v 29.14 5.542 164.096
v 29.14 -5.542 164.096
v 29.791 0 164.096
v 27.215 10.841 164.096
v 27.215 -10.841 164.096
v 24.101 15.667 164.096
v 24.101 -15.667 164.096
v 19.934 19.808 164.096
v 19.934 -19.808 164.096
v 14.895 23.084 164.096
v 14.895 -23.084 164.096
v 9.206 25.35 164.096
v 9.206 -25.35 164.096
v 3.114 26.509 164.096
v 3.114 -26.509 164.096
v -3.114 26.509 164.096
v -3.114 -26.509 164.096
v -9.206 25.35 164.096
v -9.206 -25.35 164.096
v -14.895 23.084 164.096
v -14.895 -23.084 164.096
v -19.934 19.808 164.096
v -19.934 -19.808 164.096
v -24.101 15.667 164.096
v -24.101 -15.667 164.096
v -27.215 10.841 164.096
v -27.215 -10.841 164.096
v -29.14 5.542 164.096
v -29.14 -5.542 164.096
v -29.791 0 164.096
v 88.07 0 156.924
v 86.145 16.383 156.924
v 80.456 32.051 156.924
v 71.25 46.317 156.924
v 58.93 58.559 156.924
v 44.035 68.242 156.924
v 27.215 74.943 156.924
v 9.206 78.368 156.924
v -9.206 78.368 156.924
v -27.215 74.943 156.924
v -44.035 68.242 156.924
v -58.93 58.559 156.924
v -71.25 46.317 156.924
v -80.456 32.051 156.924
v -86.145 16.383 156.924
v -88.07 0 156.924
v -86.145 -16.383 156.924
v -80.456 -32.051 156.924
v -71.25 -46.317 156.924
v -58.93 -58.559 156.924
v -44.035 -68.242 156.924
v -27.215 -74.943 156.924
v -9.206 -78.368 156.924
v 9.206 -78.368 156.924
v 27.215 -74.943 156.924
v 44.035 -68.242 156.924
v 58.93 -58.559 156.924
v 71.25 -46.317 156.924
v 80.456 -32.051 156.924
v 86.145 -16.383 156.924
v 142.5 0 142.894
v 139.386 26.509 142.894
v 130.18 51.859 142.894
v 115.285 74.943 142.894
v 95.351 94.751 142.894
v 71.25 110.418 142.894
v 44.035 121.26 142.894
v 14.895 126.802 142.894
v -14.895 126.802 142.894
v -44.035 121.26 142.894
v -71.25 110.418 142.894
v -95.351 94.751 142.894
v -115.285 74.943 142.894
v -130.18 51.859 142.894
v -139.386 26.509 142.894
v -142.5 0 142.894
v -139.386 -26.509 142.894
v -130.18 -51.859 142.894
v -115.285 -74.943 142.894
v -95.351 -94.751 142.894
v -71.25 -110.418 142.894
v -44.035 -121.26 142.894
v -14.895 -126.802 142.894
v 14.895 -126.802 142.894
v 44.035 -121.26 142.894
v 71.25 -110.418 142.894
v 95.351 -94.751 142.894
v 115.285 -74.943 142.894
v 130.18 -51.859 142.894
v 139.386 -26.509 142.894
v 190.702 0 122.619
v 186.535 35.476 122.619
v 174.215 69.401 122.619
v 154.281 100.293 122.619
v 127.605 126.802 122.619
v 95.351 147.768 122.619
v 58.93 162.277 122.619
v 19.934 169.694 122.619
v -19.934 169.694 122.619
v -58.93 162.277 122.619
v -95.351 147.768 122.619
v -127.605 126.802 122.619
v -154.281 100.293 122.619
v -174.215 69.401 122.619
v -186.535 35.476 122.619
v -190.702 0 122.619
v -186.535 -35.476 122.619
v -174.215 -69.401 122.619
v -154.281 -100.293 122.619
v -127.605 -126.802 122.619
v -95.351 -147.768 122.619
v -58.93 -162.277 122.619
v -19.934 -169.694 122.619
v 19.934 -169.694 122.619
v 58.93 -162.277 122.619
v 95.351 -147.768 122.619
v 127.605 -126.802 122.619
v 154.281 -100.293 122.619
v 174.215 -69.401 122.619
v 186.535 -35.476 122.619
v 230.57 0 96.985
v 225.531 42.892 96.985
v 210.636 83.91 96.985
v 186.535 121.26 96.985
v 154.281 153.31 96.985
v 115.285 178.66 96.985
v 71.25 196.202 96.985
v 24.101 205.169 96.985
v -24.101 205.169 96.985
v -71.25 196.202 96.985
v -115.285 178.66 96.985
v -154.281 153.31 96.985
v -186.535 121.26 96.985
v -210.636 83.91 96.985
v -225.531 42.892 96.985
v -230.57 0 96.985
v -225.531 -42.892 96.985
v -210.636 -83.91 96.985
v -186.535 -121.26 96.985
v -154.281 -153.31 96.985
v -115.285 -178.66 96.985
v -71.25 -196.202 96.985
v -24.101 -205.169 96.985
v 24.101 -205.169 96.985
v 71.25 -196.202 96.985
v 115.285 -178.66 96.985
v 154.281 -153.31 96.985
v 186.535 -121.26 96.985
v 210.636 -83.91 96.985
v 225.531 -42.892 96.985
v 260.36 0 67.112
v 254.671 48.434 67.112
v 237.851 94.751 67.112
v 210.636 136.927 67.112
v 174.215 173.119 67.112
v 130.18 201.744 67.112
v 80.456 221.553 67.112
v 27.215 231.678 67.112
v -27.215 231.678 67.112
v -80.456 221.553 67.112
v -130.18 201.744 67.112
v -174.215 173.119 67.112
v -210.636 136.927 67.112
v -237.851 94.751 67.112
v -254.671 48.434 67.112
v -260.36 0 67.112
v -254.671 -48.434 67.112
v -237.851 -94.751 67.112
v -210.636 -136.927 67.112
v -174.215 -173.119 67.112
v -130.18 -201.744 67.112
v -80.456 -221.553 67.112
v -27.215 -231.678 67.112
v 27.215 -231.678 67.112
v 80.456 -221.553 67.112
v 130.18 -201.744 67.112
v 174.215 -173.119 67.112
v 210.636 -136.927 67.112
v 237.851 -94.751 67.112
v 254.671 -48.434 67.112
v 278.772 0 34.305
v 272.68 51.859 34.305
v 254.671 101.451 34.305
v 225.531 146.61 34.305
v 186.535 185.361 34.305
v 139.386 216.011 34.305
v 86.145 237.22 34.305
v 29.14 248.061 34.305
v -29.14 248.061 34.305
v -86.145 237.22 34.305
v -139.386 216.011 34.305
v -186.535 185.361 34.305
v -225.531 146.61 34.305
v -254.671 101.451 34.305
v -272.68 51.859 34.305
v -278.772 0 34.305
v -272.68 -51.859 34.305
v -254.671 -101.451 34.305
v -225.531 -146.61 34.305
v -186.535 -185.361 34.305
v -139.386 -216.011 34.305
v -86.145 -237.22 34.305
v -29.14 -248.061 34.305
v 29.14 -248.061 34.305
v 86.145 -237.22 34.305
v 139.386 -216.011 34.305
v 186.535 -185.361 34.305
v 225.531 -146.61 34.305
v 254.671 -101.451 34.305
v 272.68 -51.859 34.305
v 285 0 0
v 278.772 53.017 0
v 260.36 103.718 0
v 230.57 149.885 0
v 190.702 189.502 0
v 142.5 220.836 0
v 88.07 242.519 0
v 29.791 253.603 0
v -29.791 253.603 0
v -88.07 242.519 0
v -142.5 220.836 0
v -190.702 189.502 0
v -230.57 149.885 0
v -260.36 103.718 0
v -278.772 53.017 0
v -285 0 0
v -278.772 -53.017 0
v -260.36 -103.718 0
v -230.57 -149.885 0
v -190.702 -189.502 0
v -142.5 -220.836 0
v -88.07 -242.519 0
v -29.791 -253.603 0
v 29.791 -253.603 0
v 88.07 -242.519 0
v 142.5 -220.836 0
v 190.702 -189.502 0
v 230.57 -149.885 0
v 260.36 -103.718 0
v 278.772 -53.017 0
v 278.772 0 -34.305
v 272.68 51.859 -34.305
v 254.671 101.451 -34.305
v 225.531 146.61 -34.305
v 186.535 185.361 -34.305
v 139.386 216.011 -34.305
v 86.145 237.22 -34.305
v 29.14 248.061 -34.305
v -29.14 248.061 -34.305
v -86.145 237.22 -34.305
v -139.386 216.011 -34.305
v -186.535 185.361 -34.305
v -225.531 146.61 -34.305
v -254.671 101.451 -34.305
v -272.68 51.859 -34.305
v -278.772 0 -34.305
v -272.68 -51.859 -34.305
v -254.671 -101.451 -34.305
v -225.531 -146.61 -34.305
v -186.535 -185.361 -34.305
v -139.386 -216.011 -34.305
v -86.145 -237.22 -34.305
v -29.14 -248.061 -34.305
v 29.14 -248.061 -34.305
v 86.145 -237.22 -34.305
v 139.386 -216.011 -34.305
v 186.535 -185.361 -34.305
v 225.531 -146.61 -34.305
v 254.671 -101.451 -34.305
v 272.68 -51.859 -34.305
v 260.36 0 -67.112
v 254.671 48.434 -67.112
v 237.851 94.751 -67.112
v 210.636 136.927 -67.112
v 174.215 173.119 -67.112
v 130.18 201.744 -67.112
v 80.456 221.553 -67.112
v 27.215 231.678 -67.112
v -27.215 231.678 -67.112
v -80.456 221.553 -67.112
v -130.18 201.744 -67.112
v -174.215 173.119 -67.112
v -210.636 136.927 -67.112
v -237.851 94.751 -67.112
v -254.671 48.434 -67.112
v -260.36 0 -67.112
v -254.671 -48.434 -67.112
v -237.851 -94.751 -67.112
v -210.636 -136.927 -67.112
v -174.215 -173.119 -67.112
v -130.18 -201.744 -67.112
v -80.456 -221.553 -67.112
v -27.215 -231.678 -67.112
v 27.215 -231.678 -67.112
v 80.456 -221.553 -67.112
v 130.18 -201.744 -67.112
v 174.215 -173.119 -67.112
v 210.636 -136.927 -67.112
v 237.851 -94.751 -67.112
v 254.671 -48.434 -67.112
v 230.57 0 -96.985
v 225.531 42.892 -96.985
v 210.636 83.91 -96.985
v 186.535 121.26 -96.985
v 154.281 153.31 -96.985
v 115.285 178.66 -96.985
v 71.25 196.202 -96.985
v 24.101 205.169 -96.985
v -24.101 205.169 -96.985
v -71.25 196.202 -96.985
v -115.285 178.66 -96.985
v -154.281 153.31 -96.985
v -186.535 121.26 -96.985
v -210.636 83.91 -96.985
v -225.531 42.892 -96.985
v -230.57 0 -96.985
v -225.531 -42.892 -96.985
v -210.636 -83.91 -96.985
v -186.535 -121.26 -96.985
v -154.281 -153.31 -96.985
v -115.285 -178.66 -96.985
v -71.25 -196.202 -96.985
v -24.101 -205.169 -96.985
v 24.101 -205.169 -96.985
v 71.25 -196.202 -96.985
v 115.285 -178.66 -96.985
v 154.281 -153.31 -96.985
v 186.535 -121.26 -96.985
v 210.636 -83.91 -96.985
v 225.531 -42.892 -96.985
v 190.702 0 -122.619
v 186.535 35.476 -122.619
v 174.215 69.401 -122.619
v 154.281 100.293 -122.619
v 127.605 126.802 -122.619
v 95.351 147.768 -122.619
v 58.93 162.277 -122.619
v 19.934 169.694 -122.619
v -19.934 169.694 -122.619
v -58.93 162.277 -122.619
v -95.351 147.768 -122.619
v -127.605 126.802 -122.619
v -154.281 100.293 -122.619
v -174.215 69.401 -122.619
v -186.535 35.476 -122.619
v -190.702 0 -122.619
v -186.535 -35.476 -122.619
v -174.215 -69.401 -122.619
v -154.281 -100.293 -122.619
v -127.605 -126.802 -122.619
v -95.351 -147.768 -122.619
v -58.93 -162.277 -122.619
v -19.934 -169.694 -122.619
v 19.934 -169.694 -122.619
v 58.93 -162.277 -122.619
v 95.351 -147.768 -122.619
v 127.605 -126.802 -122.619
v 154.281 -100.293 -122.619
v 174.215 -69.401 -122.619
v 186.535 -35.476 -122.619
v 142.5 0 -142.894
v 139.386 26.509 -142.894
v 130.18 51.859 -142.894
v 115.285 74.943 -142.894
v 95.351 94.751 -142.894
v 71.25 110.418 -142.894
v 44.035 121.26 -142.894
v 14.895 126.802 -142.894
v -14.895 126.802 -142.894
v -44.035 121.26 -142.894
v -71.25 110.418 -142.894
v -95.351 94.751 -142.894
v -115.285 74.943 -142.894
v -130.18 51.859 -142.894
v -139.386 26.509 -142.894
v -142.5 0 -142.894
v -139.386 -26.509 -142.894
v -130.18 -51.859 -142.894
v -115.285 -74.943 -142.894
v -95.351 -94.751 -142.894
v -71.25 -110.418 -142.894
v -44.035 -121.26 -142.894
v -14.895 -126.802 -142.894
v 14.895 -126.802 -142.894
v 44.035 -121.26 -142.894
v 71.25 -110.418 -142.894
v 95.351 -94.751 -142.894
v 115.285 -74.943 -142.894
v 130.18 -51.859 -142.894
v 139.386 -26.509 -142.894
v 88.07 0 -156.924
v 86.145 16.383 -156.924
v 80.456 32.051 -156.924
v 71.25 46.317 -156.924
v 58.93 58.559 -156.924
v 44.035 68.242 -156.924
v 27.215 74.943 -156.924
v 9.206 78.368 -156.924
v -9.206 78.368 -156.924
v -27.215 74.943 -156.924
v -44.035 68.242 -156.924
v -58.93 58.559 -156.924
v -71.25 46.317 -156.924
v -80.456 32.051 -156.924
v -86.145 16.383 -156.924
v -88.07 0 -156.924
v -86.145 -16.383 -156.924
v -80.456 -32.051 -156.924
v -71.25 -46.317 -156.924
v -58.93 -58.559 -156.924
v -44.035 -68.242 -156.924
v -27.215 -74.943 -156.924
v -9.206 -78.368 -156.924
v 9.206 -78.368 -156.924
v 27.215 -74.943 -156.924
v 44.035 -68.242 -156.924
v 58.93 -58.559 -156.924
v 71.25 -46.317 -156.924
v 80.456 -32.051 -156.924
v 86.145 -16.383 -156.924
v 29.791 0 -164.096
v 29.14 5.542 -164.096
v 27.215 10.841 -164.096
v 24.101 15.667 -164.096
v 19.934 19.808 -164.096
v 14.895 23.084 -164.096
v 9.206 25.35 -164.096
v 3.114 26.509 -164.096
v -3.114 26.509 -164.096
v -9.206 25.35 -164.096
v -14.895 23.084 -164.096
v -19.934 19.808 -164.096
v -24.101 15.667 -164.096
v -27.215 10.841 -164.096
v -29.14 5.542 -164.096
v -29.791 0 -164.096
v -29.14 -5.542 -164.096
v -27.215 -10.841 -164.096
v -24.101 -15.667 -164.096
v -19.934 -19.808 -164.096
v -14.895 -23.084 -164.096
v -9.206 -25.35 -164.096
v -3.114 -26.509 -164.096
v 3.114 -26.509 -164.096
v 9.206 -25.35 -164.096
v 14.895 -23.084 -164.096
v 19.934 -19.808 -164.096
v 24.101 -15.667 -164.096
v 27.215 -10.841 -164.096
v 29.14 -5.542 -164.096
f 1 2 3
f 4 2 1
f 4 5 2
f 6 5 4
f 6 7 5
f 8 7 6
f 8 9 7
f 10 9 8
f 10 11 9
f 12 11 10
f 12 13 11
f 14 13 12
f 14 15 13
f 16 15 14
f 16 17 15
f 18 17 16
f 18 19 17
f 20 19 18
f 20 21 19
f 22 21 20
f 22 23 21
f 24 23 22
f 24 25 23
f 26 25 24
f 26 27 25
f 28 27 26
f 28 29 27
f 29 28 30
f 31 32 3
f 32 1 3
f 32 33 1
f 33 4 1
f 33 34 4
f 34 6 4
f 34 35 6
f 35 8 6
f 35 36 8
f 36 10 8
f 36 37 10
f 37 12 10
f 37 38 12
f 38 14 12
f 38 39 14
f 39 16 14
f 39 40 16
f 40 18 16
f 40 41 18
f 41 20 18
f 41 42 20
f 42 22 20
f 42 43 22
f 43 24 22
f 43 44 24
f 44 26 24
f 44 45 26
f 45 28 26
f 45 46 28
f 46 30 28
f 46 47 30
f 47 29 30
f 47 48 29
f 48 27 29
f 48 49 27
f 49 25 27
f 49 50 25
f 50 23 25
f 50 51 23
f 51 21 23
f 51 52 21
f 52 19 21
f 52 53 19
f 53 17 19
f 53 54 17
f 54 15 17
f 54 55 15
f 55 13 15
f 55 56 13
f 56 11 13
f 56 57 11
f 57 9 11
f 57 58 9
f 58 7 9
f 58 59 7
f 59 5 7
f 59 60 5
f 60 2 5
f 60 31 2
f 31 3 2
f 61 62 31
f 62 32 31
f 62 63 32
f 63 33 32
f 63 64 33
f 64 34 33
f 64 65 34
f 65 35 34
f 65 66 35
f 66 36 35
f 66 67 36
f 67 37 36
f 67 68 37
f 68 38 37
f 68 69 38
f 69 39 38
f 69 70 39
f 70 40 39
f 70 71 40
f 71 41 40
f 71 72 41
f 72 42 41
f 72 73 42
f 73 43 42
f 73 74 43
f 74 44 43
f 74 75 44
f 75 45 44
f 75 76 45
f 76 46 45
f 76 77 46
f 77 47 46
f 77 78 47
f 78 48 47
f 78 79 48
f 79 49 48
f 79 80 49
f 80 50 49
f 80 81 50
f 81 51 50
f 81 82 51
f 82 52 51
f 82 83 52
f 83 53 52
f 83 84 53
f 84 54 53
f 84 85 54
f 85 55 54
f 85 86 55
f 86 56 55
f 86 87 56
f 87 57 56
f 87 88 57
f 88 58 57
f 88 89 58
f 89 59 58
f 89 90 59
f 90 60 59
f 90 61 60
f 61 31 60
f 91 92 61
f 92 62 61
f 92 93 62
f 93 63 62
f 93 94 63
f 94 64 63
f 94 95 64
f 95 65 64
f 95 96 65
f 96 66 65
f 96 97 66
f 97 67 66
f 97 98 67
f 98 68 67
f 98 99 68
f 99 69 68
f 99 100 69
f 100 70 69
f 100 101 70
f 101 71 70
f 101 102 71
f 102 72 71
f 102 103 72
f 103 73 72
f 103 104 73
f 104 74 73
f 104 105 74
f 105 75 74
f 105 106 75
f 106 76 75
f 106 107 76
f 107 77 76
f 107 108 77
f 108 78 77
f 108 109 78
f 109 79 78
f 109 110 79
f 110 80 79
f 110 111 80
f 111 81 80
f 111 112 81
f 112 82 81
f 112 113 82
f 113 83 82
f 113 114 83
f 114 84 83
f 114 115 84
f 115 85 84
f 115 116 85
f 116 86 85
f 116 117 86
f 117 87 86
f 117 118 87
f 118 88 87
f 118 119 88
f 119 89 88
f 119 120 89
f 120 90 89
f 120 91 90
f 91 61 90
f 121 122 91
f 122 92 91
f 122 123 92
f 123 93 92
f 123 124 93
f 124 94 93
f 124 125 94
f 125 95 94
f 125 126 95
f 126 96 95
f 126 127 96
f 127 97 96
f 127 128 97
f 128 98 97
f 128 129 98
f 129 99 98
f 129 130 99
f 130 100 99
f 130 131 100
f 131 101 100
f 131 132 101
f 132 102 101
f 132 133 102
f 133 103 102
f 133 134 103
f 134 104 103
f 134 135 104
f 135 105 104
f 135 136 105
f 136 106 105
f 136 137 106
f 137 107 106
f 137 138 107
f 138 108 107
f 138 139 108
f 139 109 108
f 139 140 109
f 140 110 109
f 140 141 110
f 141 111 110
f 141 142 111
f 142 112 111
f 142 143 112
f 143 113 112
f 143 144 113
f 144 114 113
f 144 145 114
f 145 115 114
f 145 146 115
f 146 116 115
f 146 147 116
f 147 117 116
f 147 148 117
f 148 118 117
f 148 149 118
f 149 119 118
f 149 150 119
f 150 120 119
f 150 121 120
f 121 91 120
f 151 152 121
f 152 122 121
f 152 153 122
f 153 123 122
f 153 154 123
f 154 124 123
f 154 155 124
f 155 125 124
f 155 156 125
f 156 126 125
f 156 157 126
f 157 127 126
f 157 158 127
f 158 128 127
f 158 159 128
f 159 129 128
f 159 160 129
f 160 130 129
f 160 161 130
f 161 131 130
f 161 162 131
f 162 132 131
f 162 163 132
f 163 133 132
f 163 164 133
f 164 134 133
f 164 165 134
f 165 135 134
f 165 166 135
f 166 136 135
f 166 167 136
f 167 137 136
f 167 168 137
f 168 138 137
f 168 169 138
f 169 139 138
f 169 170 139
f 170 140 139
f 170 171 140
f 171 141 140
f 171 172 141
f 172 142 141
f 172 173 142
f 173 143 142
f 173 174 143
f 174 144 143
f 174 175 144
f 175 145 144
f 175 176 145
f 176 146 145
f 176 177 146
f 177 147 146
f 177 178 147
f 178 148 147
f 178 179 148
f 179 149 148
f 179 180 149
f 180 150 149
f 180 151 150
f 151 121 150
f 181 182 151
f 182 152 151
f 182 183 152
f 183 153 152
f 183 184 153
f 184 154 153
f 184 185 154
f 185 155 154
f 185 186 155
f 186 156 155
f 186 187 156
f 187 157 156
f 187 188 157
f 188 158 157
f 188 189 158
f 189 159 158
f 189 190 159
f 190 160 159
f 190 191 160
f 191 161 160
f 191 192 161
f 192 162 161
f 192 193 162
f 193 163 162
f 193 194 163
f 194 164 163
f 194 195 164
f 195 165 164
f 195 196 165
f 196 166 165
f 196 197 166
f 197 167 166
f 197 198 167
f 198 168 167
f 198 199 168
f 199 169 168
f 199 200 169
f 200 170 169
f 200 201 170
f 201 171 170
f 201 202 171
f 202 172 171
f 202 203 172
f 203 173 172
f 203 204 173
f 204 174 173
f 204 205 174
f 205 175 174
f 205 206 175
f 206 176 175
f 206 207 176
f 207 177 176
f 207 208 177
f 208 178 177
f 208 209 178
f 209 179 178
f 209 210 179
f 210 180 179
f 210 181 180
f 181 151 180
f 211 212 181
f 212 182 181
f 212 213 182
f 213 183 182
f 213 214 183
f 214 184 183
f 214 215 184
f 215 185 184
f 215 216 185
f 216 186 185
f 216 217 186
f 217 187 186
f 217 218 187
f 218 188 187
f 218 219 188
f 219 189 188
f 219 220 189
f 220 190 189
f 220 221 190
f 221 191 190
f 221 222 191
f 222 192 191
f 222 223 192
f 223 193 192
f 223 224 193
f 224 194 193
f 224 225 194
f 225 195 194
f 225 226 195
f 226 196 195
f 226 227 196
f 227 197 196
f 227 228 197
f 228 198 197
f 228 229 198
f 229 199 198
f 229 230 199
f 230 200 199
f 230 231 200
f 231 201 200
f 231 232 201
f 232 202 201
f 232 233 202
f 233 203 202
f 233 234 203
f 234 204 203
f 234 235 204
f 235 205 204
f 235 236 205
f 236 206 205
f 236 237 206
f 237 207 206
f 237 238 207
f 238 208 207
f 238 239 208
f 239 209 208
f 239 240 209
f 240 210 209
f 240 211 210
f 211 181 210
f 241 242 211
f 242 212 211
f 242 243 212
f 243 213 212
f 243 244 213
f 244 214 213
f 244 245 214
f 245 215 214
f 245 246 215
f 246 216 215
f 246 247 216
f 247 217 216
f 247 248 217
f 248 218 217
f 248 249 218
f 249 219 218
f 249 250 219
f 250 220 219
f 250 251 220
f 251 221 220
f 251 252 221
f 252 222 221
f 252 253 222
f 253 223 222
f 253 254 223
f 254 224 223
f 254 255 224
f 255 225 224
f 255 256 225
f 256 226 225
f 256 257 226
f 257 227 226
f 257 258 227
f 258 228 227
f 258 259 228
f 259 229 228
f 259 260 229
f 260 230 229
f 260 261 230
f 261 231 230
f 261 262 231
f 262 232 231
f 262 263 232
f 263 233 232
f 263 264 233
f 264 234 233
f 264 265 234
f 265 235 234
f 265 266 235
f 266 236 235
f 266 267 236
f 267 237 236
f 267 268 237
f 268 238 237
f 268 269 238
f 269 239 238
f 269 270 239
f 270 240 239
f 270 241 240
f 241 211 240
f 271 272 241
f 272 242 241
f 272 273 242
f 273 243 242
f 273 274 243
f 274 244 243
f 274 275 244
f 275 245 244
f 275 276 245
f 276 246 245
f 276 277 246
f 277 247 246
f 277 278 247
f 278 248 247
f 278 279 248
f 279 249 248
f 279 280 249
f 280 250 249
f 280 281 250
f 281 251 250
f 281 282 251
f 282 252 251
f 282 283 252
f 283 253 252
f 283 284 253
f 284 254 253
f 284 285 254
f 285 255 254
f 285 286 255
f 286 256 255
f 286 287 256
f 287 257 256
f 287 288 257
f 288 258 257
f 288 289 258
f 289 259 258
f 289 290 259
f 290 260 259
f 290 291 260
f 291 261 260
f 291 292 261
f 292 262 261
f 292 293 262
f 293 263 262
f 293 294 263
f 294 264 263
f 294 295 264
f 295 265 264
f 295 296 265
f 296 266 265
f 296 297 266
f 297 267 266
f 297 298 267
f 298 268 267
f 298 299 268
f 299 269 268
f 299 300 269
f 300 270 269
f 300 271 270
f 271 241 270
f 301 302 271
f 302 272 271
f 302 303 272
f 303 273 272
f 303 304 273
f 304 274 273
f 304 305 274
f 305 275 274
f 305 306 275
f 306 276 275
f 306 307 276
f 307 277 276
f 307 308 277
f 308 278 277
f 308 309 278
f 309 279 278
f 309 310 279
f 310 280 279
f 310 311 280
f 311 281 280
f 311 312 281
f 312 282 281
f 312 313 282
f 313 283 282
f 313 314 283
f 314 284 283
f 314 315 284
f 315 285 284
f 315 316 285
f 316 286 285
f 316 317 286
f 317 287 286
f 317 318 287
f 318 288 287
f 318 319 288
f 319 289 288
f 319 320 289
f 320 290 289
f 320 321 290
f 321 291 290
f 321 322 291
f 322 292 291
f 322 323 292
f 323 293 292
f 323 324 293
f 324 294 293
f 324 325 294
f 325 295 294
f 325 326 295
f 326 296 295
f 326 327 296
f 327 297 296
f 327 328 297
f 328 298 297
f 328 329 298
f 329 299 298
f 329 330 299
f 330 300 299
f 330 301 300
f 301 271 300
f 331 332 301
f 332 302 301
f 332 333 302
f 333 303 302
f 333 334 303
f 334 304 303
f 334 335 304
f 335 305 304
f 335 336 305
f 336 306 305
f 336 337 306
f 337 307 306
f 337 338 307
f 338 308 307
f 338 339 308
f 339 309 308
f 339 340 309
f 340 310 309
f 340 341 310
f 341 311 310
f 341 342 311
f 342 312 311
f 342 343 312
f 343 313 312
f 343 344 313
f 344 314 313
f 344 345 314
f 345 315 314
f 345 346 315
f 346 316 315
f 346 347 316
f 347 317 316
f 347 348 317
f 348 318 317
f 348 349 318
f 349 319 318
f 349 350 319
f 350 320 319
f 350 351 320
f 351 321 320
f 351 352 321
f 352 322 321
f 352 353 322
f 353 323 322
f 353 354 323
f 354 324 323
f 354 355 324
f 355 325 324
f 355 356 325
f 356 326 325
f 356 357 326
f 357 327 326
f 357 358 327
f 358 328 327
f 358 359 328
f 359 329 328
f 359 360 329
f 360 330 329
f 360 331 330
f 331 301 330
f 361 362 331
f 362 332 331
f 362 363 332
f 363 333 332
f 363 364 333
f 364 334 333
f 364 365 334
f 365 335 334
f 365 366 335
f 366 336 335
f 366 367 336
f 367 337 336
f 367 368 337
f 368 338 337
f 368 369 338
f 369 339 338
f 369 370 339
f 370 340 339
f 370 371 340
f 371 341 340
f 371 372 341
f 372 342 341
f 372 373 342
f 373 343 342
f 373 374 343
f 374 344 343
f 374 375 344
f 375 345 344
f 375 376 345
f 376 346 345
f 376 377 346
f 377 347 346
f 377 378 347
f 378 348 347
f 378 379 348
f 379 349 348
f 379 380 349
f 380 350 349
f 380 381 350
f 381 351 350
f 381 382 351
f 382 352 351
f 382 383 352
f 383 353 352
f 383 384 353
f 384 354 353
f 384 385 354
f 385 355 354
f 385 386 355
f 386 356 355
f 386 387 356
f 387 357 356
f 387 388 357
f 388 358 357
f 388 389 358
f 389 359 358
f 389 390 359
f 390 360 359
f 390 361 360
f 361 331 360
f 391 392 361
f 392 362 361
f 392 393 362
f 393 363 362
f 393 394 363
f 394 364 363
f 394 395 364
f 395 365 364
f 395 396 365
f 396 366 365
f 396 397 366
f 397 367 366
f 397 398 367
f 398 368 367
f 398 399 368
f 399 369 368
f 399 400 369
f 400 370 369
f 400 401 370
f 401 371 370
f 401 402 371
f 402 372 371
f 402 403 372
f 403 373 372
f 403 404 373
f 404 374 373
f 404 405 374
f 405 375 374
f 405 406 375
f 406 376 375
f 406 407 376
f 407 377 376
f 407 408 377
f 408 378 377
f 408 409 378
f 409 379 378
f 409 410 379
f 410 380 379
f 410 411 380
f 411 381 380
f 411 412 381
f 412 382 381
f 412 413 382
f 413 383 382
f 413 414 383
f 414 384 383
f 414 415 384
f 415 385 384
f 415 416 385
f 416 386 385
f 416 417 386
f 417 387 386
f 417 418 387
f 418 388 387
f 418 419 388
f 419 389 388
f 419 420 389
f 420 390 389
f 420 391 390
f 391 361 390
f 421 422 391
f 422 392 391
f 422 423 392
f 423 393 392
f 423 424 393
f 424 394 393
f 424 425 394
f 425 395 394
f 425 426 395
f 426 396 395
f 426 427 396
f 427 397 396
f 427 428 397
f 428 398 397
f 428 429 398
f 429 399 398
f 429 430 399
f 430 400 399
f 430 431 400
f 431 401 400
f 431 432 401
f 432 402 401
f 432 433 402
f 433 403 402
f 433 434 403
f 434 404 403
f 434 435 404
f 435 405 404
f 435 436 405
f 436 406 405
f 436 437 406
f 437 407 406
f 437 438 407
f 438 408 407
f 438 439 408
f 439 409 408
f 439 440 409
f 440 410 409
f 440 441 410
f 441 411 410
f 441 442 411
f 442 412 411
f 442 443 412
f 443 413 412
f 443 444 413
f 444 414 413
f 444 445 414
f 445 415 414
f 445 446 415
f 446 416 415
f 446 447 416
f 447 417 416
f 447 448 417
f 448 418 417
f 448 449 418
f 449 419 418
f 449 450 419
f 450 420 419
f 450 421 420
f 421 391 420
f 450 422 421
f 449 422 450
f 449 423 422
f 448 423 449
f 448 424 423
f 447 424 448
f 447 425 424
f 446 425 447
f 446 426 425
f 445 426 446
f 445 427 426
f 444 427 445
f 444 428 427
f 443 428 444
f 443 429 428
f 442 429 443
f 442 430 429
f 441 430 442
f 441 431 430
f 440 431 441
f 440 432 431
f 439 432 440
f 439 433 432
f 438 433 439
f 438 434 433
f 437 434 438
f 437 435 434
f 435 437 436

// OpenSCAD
// Generated by SolidPython 1.0.1 on 2020-07-29 00:46:54


scale(v = [19, 17, 11]) {
	sphere(r = 15);
}
/***********************************************
*********      SolidPython code:      **********
************************************************
 
# import packages: SolidPython
from solid import *
from solid.utils import *
from itertools import chain, combinations, permutations


class Resize:

    def __init__(self, scad_file):
        self.scad_file = scad_file
        #self.scad_file = import_scad(scad_file)
        # cone/cylinder param:
        self.r1 = 0
        self.r2 = 0
        self.h = 0
        # rectangular prism param:
        self.w = 0
        self.l = 0
        # ellipse param:
        self.r = 0

    # import OpenScad code (file name corresponds to shape)


    # classify shape + parameters
    def assign(self, param1, param2, param3):
        if self.scad_file == 'cone.scad':
            self.r1 = param1
            self.r2 = param2
            self.h = param3
        elif self.scad_file == 'cylinder.scad':
            self.r1 = param1
            self.r2 = param2
            self.h = param3
        elif self.scad_file == 'rectangularPrism.scad':
            self.h = param1
            self.l = param2
            self.w = param3
        else:
            self.r = param1
            self.h = param2

    # resize parameters
    def iterate(self):
        x = range(3, 20, 2)
        i = 1
        if self.scad_file == 'cone.scad':
            tempList = list(permutations(x, 2))
            for temp in tempList:
                param1 = temp[0]
                param2 = temp[1]
                filepath = 'produced_scad_files/' + 'cone' + str(param1) + '_' + str(param2) + '_' + '.scad'
                scad_render_to_file(cylinder(h=param1, r1=param2, r2=0), filepath)

        elif self.scad_file == 'cylinder.scad':
            tempList = list(permutations(x, 3))
            for temp in tempList:
                param1 = temp[0]
                param2 = temp[1]
                filepath = 'produced_scad_files/' + 'cylinder' + str(param1) + '_' + str(param2) + '_' + '.scad'
                scad_render_to_file(cylinder(h=param1, r1=param2, r2=param2), filepath)

        elif self.scad_file == 'rectangularPrism.scad':
            tempList = list(permutations(x, 3))
            for temp in tempList:
                param1 = temp[0]
                param2 = temp[1]
                param3 = temp[2]
                filepath = 'produced_scad_files/' + 'rectangularPrism' + str(param1) + '_' + str(param2) + '_' + str(
                    param3) + '.scad'
                scad_render_to_file(cube(size=(param1, param2, param3)), filepath)

        elif self.scad_file == 'ellipse.scad':
            tempList = list(permutations(x, 4))
            for temp in tempList:
                param1 = temp[0]
                param2 = temp[1]
                param3 = temp[2]
                param4 = temp[3]
                filepath = 'produced_scad_files/' + 'ellipse' + str(param1) + '_' + str(param2) + '_' + str(param3) + '_' + str(param4) + '.scad'
                scad_render_to_file(scale([param1, param2, param3])(sphere(r=param4)), filepath)

    def render_to_scadfile(self):
        scad_render_to_file(scad, 'example.scad') 
 
************************************************/
